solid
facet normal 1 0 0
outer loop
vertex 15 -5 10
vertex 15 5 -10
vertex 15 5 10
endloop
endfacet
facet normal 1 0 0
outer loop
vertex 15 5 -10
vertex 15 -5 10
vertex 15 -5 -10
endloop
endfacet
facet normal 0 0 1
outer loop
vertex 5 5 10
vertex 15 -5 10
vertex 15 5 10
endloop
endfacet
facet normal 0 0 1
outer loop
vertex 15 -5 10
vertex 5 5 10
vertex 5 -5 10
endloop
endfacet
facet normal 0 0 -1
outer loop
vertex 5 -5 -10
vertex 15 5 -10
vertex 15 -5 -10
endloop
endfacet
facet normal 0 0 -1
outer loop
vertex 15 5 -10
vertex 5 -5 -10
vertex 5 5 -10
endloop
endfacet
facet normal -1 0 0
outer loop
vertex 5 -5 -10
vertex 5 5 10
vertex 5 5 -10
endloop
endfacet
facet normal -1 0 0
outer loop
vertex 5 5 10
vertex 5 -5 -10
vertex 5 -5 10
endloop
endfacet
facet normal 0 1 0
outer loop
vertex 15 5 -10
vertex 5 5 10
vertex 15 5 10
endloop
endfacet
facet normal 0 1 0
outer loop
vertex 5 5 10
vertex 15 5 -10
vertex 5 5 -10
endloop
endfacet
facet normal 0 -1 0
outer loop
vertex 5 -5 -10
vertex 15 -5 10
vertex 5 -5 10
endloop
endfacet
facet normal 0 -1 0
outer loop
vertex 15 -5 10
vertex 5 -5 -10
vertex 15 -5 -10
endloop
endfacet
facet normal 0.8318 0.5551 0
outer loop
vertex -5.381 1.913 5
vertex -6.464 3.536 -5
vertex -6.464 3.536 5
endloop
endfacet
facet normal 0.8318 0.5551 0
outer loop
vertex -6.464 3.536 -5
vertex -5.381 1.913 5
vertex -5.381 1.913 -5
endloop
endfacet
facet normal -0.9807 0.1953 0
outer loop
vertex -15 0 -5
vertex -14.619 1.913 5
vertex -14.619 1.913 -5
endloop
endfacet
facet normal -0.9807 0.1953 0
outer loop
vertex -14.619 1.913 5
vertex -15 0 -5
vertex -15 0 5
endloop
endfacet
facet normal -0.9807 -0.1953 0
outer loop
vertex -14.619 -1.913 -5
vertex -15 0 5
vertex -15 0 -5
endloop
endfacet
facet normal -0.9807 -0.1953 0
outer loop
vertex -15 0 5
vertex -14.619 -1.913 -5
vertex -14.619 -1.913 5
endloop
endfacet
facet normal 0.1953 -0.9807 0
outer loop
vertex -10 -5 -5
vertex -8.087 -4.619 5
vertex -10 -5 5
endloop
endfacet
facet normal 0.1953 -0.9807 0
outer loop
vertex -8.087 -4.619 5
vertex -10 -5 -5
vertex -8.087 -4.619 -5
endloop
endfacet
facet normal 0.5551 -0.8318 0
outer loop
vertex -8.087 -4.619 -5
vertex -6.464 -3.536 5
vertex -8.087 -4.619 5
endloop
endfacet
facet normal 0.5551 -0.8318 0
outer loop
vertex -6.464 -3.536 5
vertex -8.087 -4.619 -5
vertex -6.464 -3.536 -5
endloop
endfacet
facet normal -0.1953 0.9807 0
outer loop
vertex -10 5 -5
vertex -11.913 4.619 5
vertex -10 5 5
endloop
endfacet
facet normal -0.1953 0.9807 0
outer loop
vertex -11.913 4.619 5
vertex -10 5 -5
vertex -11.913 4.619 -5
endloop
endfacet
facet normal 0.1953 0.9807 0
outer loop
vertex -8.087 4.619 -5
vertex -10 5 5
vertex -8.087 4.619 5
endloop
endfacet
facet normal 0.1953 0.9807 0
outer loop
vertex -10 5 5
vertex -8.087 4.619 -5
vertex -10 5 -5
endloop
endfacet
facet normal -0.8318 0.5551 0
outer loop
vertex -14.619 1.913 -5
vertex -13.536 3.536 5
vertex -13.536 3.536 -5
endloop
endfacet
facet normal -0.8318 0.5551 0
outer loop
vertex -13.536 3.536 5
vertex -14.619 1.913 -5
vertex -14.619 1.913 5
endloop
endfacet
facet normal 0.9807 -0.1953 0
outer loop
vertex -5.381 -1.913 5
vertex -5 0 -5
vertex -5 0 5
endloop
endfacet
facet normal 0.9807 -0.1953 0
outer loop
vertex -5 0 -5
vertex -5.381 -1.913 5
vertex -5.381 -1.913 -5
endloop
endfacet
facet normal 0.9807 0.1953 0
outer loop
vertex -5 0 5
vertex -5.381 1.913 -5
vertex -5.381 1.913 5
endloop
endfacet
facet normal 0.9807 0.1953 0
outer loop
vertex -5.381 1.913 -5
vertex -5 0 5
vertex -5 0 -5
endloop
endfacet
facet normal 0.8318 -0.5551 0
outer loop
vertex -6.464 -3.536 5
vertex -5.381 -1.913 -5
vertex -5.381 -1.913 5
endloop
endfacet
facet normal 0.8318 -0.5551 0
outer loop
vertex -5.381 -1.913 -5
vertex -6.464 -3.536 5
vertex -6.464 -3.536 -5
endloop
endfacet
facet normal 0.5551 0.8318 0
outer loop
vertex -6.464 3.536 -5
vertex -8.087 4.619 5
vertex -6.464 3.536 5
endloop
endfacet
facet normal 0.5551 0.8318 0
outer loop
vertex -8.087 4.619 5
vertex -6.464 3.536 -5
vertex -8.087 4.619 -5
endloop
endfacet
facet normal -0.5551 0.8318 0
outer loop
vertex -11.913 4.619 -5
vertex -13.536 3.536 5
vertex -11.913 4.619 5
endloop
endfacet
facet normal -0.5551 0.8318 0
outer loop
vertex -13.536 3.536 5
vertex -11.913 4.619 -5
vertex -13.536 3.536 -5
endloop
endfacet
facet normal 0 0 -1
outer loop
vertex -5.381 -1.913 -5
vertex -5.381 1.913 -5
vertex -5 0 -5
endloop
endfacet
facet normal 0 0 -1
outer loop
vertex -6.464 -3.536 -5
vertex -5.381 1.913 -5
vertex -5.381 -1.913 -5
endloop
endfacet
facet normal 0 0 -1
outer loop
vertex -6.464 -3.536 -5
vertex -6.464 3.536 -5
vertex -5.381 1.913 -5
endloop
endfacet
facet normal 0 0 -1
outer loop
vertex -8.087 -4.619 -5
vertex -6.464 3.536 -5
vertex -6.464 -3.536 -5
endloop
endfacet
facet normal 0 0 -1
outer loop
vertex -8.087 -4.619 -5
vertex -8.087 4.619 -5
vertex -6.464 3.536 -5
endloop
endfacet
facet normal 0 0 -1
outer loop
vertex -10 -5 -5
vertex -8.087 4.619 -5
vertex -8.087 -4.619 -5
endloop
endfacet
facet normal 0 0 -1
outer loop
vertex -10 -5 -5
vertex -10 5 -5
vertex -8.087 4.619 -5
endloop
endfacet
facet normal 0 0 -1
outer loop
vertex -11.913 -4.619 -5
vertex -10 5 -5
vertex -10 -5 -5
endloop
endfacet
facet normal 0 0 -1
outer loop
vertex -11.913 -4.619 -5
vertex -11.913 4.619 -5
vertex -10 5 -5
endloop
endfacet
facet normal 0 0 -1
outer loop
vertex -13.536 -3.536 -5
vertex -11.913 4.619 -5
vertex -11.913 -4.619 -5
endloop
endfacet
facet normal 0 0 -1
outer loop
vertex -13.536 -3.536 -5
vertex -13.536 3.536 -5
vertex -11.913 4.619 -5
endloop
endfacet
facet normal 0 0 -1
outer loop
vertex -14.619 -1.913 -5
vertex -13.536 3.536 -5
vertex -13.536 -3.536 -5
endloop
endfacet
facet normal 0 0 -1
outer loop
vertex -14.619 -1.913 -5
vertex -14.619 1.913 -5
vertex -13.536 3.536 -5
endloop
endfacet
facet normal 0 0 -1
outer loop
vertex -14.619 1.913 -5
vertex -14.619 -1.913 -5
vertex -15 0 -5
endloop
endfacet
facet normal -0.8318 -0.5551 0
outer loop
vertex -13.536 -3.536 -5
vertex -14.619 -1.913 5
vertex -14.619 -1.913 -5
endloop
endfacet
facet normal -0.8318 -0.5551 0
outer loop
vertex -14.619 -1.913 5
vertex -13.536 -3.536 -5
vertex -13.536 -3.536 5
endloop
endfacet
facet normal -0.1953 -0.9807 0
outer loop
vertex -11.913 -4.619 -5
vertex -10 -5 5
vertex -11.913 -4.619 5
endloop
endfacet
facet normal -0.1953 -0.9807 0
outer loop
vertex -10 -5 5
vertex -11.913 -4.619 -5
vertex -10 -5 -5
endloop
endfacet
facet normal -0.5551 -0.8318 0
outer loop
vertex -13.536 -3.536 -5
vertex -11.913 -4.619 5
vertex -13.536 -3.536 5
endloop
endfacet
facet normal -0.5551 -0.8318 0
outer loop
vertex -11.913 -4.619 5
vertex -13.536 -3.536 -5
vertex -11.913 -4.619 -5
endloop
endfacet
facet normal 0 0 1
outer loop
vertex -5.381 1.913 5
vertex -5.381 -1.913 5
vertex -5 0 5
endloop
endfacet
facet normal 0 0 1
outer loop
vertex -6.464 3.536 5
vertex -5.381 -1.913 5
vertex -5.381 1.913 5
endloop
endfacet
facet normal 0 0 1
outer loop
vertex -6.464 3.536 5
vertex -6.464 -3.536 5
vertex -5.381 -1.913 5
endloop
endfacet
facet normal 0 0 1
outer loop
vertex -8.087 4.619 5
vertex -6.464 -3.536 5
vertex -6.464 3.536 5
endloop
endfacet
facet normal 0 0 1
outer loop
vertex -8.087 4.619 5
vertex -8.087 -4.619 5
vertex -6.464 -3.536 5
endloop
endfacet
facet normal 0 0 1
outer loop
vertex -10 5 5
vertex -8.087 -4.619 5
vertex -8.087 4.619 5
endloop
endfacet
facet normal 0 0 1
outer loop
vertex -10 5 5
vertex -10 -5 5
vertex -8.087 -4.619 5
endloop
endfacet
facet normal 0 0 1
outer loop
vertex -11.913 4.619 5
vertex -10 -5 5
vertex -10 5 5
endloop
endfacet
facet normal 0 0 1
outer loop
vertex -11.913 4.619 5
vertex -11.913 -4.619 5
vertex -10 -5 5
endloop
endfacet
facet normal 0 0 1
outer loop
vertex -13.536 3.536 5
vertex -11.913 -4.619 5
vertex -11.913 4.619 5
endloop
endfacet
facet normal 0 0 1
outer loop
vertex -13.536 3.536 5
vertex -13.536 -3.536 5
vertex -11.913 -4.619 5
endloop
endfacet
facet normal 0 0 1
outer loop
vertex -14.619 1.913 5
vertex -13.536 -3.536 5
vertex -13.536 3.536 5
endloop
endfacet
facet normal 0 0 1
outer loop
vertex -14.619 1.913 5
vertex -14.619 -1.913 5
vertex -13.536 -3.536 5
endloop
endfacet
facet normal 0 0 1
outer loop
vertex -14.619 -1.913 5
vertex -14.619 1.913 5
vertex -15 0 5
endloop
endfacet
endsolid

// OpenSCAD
//first steps

translate([10,0,0])
    cube([10,10,20], center=true);

translate([-10,0,0])
    cylinder(h=10,r=5,center=true);
